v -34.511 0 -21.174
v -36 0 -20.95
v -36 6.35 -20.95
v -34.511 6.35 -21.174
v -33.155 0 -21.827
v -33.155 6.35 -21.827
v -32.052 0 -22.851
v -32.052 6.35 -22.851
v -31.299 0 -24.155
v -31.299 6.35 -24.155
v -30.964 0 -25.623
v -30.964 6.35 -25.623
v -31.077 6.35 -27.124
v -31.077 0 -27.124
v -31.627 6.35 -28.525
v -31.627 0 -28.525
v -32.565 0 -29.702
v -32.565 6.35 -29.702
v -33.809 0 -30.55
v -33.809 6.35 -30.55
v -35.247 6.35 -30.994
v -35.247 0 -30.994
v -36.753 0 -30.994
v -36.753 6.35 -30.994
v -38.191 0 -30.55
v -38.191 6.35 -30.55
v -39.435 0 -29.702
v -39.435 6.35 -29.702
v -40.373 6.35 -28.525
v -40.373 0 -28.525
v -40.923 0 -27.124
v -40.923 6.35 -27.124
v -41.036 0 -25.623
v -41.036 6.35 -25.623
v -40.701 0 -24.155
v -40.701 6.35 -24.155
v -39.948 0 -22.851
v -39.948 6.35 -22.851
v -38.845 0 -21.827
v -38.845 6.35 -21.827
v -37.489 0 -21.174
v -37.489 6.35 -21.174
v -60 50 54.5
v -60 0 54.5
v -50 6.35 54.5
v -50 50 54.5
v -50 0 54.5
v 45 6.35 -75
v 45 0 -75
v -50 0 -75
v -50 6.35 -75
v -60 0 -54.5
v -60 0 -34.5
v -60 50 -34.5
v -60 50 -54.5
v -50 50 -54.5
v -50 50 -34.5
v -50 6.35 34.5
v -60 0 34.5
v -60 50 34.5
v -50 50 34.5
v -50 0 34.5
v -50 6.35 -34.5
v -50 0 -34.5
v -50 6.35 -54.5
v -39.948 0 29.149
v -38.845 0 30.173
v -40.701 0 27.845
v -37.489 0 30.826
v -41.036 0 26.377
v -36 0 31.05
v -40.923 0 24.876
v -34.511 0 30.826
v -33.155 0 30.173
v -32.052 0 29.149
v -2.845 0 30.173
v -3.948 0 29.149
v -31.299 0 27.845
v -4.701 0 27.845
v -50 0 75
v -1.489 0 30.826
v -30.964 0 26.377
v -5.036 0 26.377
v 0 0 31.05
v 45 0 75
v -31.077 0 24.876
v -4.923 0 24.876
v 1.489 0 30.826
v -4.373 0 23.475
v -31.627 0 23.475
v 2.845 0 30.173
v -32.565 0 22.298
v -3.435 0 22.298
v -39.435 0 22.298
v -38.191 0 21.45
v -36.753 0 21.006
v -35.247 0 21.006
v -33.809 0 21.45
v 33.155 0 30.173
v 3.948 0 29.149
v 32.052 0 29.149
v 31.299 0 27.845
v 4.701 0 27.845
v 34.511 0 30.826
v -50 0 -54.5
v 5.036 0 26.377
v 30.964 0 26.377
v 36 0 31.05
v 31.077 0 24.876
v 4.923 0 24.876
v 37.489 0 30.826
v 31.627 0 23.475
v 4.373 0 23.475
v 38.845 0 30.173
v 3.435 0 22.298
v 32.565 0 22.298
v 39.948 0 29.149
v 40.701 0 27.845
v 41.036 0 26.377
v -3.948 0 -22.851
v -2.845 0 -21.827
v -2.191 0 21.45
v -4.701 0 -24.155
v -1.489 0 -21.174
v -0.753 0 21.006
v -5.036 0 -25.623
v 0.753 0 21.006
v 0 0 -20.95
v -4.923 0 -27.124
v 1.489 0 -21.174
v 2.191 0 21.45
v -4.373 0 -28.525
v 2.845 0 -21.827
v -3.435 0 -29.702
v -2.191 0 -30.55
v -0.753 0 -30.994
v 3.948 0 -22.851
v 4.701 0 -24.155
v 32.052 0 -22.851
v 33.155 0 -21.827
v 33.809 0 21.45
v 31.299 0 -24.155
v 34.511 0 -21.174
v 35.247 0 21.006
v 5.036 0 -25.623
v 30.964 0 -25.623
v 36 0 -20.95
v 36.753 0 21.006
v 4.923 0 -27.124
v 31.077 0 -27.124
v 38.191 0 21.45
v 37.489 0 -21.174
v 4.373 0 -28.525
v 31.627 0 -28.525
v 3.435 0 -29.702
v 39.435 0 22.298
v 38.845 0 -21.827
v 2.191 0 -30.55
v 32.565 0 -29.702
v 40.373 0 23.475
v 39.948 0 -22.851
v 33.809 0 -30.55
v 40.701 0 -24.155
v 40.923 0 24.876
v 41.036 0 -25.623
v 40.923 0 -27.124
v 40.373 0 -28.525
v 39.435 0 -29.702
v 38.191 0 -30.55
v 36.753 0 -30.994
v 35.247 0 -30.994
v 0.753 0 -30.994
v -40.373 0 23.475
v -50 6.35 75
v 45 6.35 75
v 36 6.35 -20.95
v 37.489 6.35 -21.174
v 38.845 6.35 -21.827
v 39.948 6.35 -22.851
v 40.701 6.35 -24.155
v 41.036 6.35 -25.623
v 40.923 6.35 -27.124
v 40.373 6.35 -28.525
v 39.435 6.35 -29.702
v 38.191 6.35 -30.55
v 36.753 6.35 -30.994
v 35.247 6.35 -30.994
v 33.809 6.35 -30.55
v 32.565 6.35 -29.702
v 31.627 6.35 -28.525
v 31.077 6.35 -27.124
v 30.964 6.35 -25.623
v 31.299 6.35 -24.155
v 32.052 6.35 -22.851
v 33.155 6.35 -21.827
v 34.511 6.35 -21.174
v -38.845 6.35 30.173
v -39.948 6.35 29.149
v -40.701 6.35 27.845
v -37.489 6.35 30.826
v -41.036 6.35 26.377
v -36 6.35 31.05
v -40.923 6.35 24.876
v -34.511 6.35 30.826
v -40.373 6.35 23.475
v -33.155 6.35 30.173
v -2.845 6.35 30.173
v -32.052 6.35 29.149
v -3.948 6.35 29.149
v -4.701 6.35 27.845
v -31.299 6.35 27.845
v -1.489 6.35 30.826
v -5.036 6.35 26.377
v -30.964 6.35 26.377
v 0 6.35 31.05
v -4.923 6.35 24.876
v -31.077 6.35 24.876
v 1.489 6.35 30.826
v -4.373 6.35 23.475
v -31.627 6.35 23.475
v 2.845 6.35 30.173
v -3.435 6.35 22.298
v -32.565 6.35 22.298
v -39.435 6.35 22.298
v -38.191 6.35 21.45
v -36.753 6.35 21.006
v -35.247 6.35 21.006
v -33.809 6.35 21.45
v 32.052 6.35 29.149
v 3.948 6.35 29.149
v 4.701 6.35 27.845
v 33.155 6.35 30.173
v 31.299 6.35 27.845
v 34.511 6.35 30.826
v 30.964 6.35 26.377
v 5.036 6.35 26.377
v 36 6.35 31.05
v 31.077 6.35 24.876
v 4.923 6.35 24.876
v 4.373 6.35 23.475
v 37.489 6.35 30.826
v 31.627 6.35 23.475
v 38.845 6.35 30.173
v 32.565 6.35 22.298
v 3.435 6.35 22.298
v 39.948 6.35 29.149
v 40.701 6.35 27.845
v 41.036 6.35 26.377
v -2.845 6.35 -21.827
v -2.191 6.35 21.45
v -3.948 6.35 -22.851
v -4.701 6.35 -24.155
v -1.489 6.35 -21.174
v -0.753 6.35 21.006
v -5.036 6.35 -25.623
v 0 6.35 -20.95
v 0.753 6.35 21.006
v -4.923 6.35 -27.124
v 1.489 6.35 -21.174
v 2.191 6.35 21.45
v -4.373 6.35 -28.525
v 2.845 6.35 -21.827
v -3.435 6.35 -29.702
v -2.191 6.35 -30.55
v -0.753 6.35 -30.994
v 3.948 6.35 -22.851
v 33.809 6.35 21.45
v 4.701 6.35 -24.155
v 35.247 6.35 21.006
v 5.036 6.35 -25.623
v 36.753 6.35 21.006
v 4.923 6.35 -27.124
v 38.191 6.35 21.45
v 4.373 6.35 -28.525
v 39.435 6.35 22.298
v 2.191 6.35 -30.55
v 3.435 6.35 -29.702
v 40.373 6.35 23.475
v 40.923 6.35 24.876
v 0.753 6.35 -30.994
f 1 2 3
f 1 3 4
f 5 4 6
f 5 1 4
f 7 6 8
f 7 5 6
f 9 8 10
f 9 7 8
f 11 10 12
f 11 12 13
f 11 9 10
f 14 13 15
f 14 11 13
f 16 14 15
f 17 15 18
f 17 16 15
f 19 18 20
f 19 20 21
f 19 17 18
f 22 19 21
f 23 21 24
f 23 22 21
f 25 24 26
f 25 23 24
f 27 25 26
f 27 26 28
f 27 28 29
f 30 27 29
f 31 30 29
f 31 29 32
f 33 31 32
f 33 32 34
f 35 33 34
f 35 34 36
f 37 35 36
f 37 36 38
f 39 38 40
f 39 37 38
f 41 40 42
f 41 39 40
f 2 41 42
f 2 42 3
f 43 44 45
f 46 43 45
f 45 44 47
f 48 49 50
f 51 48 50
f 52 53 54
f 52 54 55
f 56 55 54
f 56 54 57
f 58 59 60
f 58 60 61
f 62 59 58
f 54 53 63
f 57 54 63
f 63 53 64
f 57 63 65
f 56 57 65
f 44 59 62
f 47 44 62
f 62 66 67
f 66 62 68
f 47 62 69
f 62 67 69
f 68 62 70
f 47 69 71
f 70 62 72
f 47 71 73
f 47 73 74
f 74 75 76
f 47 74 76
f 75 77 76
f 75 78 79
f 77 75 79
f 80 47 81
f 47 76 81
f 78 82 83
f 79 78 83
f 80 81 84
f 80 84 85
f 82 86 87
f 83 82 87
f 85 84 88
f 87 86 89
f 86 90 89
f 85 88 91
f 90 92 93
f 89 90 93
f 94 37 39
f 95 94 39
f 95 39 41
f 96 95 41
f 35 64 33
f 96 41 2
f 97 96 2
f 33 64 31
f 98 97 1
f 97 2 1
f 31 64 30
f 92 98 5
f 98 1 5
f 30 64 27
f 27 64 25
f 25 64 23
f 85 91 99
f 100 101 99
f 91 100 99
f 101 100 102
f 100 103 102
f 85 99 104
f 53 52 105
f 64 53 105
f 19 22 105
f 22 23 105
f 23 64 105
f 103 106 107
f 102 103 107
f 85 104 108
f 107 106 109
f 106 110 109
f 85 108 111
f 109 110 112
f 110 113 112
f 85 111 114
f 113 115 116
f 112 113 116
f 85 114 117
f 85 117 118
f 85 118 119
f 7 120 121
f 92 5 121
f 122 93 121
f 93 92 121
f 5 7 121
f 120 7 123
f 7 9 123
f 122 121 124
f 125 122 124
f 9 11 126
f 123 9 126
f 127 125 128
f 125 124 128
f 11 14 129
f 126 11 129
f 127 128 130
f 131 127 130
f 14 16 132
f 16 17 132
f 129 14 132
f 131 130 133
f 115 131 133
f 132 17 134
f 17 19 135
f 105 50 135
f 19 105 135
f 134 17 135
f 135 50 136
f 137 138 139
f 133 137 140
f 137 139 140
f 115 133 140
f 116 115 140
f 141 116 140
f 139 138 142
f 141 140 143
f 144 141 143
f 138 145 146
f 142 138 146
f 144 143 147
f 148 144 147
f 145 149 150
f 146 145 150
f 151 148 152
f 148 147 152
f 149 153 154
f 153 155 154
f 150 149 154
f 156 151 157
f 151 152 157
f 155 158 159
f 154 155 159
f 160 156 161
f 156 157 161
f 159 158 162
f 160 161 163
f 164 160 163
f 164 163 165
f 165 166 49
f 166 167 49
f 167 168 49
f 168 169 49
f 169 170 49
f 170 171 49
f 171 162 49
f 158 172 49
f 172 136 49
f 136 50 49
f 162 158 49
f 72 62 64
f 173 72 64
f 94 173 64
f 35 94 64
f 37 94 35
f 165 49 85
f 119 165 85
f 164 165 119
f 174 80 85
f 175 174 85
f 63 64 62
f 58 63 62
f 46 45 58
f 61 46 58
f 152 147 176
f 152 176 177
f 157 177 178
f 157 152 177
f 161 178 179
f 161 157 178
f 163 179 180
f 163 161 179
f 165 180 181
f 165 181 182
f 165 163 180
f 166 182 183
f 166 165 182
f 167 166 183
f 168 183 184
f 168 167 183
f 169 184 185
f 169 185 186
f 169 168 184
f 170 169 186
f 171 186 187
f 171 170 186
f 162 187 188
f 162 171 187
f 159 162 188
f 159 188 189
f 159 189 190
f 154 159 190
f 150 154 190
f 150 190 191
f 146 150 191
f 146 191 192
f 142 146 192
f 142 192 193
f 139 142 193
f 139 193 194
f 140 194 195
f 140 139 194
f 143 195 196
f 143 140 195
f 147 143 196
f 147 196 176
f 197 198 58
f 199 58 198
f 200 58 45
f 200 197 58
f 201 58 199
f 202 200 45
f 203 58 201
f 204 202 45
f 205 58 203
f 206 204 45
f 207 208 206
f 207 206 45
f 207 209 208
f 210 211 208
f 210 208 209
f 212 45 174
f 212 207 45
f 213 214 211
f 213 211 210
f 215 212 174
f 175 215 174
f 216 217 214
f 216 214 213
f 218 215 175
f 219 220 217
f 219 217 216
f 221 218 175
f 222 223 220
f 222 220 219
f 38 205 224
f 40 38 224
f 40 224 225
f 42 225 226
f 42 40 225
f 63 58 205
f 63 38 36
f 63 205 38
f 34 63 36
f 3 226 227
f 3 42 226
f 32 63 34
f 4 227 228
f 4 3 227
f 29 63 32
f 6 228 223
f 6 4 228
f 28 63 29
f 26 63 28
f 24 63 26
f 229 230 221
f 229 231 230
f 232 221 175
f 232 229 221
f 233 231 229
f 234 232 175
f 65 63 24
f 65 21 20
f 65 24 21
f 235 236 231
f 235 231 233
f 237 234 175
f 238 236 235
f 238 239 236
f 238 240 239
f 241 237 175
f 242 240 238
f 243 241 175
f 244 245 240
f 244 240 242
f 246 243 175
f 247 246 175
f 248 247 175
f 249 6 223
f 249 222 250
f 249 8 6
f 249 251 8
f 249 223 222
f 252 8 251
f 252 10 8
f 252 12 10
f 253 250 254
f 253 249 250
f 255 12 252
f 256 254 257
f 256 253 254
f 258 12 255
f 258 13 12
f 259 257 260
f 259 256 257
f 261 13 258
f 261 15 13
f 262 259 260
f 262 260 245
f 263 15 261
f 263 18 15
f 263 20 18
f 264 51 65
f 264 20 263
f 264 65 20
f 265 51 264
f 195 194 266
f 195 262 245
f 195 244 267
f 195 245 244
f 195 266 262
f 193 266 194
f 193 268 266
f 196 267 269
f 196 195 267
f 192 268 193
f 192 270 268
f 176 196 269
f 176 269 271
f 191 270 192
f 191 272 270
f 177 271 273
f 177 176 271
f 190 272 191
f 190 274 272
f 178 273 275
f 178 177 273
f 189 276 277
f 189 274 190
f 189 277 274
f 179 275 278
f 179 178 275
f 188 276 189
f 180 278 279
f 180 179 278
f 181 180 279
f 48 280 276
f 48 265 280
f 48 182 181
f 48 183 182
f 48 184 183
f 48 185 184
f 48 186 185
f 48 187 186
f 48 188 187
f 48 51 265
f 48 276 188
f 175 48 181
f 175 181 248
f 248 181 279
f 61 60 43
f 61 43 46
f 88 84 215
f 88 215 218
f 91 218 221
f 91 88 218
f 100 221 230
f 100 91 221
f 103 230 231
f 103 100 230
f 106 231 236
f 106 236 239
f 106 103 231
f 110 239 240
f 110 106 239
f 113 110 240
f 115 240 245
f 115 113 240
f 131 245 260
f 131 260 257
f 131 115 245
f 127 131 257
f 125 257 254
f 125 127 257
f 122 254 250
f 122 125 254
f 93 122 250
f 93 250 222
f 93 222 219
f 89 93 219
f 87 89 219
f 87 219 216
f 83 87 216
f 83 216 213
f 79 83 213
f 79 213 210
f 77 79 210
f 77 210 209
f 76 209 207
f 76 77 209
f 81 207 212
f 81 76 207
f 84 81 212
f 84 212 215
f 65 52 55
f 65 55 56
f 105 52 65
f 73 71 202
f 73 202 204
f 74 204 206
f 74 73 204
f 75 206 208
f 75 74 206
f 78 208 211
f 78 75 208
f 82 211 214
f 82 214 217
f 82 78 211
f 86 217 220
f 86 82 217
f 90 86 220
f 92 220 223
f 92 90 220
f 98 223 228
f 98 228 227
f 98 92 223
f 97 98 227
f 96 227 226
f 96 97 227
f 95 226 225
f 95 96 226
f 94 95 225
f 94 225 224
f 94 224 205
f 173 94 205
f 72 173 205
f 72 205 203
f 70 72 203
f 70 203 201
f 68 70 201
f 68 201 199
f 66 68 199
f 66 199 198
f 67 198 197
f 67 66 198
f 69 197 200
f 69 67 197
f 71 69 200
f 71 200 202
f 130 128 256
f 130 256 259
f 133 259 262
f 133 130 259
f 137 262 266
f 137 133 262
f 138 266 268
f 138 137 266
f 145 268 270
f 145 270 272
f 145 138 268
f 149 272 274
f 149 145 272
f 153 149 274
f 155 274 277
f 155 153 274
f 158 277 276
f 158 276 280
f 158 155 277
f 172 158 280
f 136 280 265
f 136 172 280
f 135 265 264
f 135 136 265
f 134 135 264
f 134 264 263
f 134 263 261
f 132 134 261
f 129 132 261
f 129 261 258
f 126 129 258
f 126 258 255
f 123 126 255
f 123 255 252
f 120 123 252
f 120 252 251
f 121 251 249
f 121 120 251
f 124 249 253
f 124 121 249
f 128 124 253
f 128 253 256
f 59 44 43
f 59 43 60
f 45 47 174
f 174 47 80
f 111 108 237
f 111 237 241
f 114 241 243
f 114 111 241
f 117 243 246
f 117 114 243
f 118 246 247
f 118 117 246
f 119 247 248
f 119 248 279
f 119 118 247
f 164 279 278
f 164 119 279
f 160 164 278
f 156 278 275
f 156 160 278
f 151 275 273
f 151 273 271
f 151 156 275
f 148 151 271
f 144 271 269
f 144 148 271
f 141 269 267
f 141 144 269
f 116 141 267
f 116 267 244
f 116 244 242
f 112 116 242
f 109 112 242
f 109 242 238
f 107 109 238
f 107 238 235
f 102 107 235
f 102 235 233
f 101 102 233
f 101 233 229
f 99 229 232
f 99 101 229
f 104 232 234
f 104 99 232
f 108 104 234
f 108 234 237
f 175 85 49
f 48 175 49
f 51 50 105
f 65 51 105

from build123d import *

# Parameters (mm, degrees)
SKETCH1_R           = 5.05
BOSS_EXTRUDE1_DEPTH = 6.35
SKETCH2_W           = 10
SKETCH2_H           = 20
BOSS_EXTRUDE2_DEPTH = 50


with BuildPart() as part:
    # Sketch1 → Boss-Extrude1 (new body)
    with BuildSketch(Plane(origin=(0, 0, 0), x_dir=(1, 0, 0), z_dir=(0, 1, 0))):
        Polygon((45, 75), (-50, 75), (-50, 67.7), (-50, 47.7), (-50, -47.7), (-50, -67.7), (-50, -75), (45, -75), align=None)
        with Locations(Location((-36, 26, 0), (0, 0, 270))):
            Circle(SKETCH1_R, mode=Mode.SUBTRACT)
        with Locations(Location((36, 26, 0), (0, 0, 270))):
            Circle(SKETCH1_R, mode=Mode.SUBTRACT)
        with Locations(Location((36, -26, 0), (0, 0, 270))):
            Circle(SKETCH1_R, mode=Mode.SUBTRACT)
        with Locations(Location((-36, -26, 0), (0, 0, 270))):
            Circle(SKETCH1_R, mode=Mode.SUBTRACT)
        with Locations(Location((0, 26, 0), (0, 0, 270))):
            Circle(SKETCH1_R, mode=Mode.SUBTRACT)
        with Locations(Location((0, -26, 0), (0, 0, 270))):
            Circle(SKETCH1_R, mode=Mode.SUBTRACT)
    extrude(amount=BOSS_EXTRUDE1_DEPTH)

    # Sketch2 → Boss-Extrude2 (add)
    with BuildSketch(Plane(origin=(0, 0, 0), x_dir=(1, 0, 0), z_dir=(0, 1, 0))):
        with Locations((-55, 44.5)):
            Rectangle(SKETCH2_W, SKETCH2_H)
        with Locations((-55, -44.5)):
            Rectangle(SKETCH2_W, SKETCH2_H)
    extrude(amount=BOSS_EXTRUDE2_DEPTH)


solid = part.part
